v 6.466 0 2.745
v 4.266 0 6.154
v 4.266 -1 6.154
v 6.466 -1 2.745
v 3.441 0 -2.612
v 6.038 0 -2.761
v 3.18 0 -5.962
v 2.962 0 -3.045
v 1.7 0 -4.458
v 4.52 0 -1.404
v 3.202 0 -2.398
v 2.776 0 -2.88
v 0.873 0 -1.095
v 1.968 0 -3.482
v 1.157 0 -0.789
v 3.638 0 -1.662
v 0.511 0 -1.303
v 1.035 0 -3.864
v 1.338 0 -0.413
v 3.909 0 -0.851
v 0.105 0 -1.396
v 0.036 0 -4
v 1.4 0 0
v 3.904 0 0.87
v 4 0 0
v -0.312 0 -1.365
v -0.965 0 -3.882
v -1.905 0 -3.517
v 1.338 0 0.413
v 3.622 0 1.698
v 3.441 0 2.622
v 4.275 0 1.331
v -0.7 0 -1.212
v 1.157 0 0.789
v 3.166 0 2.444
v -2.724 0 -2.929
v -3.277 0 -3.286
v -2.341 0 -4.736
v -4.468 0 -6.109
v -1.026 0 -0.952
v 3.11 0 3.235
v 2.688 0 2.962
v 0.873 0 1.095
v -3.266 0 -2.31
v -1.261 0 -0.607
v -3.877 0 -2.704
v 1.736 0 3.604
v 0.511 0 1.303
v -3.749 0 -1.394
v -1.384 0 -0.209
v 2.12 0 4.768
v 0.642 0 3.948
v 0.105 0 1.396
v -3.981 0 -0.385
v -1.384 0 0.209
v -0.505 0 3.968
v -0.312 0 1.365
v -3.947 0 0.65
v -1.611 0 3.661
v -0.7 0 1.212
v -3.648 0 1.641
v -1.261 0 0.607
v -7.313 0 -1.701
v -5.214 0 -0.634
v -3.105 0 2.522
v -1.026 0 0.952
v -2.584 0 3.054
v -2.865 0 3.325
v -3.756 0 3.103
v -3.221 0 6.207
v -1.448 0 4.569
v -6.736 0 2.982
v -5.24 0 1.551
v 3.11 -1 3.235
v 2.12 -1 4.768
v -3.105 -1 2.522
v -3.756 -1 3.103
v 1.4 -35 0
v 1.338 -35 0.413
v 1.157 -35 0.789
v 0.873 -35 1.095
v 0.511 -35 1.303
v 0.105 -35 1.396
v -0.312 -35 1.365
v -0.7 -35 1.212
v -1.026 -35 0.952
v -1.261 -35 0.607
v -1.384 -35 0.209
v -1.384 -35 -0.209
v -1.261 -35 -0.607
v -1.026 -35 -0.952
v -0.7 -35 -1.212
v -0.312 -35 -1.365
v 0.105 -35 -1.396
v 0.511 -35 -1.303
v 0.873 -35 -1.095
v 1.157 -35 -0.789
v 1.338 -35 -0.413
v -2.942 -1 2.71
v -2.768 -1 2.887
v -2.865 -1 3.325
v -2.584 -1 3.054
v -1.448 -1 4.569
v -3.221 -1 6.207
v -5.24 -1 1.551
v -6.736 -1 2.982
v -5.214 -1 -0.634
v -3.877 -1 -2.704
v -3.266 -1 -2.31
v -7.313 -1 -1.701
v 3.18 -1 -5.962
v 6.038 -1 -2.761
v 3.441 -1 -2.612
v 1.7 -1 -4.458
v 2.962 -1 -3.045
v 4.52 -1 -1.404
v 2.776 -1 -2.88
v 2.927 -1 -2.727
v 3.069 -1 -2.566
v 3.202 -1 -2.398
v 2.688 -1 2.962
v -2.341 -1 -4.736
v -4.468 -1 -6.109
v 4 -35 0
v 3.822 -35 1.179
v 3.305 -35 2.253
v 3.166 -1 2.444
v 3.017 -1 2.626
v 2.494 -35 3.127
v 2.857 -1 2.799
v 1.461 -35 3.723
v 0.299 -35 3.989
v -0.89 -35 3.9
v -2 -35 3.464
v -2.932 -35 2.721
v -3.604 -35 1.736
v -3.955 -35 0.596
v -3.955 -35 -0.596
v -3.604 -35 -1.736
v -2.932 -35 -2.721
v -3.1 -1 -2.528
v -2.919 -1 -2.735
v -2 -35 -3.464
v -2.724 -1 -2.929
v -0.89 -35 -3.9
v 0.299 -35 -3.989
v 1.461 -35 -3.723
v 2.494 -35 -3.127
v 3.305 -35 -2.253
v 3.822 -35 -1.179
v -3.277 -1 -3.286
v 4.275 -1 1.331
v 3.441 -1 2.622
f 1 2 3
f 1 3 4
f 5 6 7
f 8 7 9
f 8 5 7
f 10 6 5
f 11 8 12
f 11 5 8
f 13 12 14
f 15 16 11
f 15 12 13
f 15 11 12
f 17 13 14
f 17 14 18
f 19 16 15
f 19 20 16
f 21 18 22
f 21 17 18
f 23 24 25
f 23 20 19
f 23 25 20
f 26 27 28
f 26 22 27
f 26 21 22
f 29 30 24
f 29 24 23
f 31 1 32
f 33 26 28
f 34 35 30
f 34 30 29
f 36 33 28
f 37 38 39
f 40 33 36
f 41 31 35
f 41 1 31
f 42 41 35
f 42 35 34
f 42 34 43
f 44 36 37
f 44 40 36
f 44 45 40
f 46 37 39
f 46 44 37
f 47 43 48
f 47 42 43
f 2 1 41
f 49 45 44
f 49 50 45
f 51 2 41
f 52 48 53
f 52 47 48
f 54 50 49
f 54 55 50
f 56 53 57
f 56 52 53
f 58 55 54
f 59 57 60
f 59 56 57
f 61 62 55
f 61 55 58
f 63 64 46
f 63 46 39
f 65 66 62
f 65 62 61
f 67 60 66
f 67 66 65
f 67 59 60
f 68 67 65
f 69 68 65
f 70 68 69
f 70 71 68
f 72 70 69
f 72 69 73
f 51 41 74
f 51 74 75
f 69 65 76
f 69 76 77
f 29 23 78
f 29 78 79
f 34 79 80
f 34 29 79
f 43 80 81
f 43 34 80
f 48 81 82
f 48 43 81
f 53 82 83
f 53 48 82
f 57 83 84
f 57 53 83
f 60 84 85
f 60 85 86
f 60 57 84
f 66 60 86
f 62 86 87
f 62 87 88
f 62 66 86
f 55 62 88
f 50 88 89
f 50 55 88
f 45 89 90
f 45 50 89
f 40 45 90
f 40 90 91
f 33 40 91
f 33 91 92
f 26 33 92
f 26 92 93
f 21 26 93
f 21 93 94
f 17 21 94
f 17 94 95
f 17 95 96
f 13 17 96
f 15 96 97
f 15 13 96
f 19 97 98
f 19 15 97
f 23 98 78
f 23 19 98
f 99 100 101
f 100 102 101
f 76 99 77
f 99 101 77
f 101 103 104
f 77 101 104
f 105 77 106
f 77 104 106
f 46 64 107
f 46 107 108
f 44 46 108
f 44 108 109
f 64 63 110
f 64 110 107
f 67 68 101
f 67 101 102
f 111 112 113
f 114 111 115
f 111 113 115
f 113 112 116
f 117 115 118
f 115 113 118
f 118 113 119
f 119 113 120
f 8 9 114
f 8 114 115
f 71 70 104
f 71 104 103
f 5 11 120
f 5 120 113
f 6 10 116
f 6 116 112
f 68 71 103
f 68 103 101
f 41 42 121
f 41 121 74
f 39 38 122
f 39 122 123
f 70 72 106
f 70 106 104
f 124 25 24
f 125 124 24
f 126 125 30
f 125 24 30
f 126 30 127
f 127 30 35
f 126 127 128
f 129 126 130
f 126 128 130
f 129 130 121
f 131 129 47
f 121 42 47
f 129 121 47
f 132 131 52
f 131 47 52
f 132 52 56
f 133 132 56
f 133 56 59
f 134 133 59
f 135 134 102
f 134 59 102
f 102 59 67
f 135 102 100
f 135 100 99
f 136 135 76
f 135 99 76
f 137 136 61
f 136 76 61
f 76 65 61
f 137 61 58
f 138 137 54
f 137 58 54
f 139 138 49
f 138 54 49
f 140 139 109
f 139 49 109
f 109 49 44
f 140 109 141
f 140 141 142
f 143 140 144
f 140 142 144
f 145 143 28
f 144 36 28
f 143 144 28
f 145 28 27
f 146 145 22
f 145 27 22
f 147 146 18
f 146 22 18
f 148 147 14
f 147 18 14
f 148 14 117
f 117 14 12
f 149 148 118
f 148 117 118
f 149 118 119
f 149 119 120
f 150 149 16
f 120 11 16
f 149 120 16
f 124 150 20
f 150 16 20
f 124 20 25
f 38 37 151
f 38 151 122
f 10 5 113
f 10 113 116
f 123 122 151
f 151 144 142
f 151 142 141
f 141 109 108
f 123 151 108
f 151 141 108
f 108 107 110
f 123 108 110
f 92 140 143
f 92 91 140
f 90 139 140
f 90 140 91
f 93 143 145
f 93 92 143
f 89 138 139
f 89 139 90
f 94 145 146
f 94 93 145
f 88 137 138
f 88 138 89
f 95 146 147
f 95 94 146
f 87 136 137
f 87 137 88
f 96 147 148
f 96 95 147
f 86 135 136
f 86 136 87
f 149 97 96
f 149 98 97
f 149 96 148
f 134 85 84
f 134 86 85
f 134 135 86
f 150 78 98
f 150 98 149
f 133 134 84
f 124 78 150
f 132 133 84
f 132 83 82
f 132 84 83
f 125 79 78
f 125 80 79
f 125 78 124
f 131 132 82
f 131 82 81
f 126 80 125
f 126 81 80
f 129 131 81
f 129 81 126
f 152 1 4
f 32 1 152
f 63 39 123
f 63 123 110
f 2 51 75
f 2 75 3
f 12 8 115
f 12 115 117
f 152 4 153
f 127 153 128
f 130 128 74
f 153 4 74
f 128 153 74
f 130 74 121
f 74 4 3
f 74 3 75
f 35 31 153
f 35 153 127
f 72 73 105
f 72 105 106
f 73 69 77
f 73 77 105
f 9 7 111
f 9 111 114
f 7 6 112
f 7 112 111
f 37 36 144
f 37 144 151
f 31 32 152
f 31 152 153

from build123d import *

# Parameters (mm, degrees)
F0_R     = 4
F0_R_2   = 1.4
F1_DEPTH = 35
F4_DEPTH = 1


with BuildPart() as f1:
    # F0 (on Front) → F1 (new body)
    with BuildSketch(Plane.XZ):
        Circle(F0_R)
        Circle(F0_R_2, mode=Mode.SUBTRACT)
    extrude(amount=F1_DEPTH)

    # F3 (on face) → F4 (join)
    with BuildSketch(Plane(origin=(0, 0, 0), x_dir=(-1, 0, 0), z_dir=(0, 1, 0))):
        Polygon((-3.441267, 2.621837), (-2.658013, 2.116282), (-2.527552, 2.052343), (-2.159969, 2.621837), (-3.109507, 3.23472), (-2.119805, 4.768063), (-4.266258, 6.153501), (-6.466136, 2.745238), (-4.274626, 1.330718), align=None)
        Polygon((-2.259792, -2.418553), (-2.658013, -1.912313), (-3.441267, -2.611758), (-4.519502, -1.404327), (-6.038423, -2.760721), (-3.180103, -5.961532), (-1.700384, -4.458029), (-2.961811, -3.045455), align=None)
        Polygon((3.877339, -2.704357), (2.650228, -1.912313), (2.136546, -2.549902), (3.276904, -3.285951), (2.340704, -4.736403), (4.467671, -6.109263), (7.312901, -1.701158), (5.213581, -0.634123), align=None)
        Polygon((2.864772, 3.32476), (2.136546, 2.621837), (2.650228, 2.116282), (3.755631, 3.103405), (5.239515, 1.551226), (6.736414, 2.982262), (3.221487, 6.206864), (1.448484, 4.569151), align=None)
    extrude(amount=-F4_DEPTH)


solid = f1.part
